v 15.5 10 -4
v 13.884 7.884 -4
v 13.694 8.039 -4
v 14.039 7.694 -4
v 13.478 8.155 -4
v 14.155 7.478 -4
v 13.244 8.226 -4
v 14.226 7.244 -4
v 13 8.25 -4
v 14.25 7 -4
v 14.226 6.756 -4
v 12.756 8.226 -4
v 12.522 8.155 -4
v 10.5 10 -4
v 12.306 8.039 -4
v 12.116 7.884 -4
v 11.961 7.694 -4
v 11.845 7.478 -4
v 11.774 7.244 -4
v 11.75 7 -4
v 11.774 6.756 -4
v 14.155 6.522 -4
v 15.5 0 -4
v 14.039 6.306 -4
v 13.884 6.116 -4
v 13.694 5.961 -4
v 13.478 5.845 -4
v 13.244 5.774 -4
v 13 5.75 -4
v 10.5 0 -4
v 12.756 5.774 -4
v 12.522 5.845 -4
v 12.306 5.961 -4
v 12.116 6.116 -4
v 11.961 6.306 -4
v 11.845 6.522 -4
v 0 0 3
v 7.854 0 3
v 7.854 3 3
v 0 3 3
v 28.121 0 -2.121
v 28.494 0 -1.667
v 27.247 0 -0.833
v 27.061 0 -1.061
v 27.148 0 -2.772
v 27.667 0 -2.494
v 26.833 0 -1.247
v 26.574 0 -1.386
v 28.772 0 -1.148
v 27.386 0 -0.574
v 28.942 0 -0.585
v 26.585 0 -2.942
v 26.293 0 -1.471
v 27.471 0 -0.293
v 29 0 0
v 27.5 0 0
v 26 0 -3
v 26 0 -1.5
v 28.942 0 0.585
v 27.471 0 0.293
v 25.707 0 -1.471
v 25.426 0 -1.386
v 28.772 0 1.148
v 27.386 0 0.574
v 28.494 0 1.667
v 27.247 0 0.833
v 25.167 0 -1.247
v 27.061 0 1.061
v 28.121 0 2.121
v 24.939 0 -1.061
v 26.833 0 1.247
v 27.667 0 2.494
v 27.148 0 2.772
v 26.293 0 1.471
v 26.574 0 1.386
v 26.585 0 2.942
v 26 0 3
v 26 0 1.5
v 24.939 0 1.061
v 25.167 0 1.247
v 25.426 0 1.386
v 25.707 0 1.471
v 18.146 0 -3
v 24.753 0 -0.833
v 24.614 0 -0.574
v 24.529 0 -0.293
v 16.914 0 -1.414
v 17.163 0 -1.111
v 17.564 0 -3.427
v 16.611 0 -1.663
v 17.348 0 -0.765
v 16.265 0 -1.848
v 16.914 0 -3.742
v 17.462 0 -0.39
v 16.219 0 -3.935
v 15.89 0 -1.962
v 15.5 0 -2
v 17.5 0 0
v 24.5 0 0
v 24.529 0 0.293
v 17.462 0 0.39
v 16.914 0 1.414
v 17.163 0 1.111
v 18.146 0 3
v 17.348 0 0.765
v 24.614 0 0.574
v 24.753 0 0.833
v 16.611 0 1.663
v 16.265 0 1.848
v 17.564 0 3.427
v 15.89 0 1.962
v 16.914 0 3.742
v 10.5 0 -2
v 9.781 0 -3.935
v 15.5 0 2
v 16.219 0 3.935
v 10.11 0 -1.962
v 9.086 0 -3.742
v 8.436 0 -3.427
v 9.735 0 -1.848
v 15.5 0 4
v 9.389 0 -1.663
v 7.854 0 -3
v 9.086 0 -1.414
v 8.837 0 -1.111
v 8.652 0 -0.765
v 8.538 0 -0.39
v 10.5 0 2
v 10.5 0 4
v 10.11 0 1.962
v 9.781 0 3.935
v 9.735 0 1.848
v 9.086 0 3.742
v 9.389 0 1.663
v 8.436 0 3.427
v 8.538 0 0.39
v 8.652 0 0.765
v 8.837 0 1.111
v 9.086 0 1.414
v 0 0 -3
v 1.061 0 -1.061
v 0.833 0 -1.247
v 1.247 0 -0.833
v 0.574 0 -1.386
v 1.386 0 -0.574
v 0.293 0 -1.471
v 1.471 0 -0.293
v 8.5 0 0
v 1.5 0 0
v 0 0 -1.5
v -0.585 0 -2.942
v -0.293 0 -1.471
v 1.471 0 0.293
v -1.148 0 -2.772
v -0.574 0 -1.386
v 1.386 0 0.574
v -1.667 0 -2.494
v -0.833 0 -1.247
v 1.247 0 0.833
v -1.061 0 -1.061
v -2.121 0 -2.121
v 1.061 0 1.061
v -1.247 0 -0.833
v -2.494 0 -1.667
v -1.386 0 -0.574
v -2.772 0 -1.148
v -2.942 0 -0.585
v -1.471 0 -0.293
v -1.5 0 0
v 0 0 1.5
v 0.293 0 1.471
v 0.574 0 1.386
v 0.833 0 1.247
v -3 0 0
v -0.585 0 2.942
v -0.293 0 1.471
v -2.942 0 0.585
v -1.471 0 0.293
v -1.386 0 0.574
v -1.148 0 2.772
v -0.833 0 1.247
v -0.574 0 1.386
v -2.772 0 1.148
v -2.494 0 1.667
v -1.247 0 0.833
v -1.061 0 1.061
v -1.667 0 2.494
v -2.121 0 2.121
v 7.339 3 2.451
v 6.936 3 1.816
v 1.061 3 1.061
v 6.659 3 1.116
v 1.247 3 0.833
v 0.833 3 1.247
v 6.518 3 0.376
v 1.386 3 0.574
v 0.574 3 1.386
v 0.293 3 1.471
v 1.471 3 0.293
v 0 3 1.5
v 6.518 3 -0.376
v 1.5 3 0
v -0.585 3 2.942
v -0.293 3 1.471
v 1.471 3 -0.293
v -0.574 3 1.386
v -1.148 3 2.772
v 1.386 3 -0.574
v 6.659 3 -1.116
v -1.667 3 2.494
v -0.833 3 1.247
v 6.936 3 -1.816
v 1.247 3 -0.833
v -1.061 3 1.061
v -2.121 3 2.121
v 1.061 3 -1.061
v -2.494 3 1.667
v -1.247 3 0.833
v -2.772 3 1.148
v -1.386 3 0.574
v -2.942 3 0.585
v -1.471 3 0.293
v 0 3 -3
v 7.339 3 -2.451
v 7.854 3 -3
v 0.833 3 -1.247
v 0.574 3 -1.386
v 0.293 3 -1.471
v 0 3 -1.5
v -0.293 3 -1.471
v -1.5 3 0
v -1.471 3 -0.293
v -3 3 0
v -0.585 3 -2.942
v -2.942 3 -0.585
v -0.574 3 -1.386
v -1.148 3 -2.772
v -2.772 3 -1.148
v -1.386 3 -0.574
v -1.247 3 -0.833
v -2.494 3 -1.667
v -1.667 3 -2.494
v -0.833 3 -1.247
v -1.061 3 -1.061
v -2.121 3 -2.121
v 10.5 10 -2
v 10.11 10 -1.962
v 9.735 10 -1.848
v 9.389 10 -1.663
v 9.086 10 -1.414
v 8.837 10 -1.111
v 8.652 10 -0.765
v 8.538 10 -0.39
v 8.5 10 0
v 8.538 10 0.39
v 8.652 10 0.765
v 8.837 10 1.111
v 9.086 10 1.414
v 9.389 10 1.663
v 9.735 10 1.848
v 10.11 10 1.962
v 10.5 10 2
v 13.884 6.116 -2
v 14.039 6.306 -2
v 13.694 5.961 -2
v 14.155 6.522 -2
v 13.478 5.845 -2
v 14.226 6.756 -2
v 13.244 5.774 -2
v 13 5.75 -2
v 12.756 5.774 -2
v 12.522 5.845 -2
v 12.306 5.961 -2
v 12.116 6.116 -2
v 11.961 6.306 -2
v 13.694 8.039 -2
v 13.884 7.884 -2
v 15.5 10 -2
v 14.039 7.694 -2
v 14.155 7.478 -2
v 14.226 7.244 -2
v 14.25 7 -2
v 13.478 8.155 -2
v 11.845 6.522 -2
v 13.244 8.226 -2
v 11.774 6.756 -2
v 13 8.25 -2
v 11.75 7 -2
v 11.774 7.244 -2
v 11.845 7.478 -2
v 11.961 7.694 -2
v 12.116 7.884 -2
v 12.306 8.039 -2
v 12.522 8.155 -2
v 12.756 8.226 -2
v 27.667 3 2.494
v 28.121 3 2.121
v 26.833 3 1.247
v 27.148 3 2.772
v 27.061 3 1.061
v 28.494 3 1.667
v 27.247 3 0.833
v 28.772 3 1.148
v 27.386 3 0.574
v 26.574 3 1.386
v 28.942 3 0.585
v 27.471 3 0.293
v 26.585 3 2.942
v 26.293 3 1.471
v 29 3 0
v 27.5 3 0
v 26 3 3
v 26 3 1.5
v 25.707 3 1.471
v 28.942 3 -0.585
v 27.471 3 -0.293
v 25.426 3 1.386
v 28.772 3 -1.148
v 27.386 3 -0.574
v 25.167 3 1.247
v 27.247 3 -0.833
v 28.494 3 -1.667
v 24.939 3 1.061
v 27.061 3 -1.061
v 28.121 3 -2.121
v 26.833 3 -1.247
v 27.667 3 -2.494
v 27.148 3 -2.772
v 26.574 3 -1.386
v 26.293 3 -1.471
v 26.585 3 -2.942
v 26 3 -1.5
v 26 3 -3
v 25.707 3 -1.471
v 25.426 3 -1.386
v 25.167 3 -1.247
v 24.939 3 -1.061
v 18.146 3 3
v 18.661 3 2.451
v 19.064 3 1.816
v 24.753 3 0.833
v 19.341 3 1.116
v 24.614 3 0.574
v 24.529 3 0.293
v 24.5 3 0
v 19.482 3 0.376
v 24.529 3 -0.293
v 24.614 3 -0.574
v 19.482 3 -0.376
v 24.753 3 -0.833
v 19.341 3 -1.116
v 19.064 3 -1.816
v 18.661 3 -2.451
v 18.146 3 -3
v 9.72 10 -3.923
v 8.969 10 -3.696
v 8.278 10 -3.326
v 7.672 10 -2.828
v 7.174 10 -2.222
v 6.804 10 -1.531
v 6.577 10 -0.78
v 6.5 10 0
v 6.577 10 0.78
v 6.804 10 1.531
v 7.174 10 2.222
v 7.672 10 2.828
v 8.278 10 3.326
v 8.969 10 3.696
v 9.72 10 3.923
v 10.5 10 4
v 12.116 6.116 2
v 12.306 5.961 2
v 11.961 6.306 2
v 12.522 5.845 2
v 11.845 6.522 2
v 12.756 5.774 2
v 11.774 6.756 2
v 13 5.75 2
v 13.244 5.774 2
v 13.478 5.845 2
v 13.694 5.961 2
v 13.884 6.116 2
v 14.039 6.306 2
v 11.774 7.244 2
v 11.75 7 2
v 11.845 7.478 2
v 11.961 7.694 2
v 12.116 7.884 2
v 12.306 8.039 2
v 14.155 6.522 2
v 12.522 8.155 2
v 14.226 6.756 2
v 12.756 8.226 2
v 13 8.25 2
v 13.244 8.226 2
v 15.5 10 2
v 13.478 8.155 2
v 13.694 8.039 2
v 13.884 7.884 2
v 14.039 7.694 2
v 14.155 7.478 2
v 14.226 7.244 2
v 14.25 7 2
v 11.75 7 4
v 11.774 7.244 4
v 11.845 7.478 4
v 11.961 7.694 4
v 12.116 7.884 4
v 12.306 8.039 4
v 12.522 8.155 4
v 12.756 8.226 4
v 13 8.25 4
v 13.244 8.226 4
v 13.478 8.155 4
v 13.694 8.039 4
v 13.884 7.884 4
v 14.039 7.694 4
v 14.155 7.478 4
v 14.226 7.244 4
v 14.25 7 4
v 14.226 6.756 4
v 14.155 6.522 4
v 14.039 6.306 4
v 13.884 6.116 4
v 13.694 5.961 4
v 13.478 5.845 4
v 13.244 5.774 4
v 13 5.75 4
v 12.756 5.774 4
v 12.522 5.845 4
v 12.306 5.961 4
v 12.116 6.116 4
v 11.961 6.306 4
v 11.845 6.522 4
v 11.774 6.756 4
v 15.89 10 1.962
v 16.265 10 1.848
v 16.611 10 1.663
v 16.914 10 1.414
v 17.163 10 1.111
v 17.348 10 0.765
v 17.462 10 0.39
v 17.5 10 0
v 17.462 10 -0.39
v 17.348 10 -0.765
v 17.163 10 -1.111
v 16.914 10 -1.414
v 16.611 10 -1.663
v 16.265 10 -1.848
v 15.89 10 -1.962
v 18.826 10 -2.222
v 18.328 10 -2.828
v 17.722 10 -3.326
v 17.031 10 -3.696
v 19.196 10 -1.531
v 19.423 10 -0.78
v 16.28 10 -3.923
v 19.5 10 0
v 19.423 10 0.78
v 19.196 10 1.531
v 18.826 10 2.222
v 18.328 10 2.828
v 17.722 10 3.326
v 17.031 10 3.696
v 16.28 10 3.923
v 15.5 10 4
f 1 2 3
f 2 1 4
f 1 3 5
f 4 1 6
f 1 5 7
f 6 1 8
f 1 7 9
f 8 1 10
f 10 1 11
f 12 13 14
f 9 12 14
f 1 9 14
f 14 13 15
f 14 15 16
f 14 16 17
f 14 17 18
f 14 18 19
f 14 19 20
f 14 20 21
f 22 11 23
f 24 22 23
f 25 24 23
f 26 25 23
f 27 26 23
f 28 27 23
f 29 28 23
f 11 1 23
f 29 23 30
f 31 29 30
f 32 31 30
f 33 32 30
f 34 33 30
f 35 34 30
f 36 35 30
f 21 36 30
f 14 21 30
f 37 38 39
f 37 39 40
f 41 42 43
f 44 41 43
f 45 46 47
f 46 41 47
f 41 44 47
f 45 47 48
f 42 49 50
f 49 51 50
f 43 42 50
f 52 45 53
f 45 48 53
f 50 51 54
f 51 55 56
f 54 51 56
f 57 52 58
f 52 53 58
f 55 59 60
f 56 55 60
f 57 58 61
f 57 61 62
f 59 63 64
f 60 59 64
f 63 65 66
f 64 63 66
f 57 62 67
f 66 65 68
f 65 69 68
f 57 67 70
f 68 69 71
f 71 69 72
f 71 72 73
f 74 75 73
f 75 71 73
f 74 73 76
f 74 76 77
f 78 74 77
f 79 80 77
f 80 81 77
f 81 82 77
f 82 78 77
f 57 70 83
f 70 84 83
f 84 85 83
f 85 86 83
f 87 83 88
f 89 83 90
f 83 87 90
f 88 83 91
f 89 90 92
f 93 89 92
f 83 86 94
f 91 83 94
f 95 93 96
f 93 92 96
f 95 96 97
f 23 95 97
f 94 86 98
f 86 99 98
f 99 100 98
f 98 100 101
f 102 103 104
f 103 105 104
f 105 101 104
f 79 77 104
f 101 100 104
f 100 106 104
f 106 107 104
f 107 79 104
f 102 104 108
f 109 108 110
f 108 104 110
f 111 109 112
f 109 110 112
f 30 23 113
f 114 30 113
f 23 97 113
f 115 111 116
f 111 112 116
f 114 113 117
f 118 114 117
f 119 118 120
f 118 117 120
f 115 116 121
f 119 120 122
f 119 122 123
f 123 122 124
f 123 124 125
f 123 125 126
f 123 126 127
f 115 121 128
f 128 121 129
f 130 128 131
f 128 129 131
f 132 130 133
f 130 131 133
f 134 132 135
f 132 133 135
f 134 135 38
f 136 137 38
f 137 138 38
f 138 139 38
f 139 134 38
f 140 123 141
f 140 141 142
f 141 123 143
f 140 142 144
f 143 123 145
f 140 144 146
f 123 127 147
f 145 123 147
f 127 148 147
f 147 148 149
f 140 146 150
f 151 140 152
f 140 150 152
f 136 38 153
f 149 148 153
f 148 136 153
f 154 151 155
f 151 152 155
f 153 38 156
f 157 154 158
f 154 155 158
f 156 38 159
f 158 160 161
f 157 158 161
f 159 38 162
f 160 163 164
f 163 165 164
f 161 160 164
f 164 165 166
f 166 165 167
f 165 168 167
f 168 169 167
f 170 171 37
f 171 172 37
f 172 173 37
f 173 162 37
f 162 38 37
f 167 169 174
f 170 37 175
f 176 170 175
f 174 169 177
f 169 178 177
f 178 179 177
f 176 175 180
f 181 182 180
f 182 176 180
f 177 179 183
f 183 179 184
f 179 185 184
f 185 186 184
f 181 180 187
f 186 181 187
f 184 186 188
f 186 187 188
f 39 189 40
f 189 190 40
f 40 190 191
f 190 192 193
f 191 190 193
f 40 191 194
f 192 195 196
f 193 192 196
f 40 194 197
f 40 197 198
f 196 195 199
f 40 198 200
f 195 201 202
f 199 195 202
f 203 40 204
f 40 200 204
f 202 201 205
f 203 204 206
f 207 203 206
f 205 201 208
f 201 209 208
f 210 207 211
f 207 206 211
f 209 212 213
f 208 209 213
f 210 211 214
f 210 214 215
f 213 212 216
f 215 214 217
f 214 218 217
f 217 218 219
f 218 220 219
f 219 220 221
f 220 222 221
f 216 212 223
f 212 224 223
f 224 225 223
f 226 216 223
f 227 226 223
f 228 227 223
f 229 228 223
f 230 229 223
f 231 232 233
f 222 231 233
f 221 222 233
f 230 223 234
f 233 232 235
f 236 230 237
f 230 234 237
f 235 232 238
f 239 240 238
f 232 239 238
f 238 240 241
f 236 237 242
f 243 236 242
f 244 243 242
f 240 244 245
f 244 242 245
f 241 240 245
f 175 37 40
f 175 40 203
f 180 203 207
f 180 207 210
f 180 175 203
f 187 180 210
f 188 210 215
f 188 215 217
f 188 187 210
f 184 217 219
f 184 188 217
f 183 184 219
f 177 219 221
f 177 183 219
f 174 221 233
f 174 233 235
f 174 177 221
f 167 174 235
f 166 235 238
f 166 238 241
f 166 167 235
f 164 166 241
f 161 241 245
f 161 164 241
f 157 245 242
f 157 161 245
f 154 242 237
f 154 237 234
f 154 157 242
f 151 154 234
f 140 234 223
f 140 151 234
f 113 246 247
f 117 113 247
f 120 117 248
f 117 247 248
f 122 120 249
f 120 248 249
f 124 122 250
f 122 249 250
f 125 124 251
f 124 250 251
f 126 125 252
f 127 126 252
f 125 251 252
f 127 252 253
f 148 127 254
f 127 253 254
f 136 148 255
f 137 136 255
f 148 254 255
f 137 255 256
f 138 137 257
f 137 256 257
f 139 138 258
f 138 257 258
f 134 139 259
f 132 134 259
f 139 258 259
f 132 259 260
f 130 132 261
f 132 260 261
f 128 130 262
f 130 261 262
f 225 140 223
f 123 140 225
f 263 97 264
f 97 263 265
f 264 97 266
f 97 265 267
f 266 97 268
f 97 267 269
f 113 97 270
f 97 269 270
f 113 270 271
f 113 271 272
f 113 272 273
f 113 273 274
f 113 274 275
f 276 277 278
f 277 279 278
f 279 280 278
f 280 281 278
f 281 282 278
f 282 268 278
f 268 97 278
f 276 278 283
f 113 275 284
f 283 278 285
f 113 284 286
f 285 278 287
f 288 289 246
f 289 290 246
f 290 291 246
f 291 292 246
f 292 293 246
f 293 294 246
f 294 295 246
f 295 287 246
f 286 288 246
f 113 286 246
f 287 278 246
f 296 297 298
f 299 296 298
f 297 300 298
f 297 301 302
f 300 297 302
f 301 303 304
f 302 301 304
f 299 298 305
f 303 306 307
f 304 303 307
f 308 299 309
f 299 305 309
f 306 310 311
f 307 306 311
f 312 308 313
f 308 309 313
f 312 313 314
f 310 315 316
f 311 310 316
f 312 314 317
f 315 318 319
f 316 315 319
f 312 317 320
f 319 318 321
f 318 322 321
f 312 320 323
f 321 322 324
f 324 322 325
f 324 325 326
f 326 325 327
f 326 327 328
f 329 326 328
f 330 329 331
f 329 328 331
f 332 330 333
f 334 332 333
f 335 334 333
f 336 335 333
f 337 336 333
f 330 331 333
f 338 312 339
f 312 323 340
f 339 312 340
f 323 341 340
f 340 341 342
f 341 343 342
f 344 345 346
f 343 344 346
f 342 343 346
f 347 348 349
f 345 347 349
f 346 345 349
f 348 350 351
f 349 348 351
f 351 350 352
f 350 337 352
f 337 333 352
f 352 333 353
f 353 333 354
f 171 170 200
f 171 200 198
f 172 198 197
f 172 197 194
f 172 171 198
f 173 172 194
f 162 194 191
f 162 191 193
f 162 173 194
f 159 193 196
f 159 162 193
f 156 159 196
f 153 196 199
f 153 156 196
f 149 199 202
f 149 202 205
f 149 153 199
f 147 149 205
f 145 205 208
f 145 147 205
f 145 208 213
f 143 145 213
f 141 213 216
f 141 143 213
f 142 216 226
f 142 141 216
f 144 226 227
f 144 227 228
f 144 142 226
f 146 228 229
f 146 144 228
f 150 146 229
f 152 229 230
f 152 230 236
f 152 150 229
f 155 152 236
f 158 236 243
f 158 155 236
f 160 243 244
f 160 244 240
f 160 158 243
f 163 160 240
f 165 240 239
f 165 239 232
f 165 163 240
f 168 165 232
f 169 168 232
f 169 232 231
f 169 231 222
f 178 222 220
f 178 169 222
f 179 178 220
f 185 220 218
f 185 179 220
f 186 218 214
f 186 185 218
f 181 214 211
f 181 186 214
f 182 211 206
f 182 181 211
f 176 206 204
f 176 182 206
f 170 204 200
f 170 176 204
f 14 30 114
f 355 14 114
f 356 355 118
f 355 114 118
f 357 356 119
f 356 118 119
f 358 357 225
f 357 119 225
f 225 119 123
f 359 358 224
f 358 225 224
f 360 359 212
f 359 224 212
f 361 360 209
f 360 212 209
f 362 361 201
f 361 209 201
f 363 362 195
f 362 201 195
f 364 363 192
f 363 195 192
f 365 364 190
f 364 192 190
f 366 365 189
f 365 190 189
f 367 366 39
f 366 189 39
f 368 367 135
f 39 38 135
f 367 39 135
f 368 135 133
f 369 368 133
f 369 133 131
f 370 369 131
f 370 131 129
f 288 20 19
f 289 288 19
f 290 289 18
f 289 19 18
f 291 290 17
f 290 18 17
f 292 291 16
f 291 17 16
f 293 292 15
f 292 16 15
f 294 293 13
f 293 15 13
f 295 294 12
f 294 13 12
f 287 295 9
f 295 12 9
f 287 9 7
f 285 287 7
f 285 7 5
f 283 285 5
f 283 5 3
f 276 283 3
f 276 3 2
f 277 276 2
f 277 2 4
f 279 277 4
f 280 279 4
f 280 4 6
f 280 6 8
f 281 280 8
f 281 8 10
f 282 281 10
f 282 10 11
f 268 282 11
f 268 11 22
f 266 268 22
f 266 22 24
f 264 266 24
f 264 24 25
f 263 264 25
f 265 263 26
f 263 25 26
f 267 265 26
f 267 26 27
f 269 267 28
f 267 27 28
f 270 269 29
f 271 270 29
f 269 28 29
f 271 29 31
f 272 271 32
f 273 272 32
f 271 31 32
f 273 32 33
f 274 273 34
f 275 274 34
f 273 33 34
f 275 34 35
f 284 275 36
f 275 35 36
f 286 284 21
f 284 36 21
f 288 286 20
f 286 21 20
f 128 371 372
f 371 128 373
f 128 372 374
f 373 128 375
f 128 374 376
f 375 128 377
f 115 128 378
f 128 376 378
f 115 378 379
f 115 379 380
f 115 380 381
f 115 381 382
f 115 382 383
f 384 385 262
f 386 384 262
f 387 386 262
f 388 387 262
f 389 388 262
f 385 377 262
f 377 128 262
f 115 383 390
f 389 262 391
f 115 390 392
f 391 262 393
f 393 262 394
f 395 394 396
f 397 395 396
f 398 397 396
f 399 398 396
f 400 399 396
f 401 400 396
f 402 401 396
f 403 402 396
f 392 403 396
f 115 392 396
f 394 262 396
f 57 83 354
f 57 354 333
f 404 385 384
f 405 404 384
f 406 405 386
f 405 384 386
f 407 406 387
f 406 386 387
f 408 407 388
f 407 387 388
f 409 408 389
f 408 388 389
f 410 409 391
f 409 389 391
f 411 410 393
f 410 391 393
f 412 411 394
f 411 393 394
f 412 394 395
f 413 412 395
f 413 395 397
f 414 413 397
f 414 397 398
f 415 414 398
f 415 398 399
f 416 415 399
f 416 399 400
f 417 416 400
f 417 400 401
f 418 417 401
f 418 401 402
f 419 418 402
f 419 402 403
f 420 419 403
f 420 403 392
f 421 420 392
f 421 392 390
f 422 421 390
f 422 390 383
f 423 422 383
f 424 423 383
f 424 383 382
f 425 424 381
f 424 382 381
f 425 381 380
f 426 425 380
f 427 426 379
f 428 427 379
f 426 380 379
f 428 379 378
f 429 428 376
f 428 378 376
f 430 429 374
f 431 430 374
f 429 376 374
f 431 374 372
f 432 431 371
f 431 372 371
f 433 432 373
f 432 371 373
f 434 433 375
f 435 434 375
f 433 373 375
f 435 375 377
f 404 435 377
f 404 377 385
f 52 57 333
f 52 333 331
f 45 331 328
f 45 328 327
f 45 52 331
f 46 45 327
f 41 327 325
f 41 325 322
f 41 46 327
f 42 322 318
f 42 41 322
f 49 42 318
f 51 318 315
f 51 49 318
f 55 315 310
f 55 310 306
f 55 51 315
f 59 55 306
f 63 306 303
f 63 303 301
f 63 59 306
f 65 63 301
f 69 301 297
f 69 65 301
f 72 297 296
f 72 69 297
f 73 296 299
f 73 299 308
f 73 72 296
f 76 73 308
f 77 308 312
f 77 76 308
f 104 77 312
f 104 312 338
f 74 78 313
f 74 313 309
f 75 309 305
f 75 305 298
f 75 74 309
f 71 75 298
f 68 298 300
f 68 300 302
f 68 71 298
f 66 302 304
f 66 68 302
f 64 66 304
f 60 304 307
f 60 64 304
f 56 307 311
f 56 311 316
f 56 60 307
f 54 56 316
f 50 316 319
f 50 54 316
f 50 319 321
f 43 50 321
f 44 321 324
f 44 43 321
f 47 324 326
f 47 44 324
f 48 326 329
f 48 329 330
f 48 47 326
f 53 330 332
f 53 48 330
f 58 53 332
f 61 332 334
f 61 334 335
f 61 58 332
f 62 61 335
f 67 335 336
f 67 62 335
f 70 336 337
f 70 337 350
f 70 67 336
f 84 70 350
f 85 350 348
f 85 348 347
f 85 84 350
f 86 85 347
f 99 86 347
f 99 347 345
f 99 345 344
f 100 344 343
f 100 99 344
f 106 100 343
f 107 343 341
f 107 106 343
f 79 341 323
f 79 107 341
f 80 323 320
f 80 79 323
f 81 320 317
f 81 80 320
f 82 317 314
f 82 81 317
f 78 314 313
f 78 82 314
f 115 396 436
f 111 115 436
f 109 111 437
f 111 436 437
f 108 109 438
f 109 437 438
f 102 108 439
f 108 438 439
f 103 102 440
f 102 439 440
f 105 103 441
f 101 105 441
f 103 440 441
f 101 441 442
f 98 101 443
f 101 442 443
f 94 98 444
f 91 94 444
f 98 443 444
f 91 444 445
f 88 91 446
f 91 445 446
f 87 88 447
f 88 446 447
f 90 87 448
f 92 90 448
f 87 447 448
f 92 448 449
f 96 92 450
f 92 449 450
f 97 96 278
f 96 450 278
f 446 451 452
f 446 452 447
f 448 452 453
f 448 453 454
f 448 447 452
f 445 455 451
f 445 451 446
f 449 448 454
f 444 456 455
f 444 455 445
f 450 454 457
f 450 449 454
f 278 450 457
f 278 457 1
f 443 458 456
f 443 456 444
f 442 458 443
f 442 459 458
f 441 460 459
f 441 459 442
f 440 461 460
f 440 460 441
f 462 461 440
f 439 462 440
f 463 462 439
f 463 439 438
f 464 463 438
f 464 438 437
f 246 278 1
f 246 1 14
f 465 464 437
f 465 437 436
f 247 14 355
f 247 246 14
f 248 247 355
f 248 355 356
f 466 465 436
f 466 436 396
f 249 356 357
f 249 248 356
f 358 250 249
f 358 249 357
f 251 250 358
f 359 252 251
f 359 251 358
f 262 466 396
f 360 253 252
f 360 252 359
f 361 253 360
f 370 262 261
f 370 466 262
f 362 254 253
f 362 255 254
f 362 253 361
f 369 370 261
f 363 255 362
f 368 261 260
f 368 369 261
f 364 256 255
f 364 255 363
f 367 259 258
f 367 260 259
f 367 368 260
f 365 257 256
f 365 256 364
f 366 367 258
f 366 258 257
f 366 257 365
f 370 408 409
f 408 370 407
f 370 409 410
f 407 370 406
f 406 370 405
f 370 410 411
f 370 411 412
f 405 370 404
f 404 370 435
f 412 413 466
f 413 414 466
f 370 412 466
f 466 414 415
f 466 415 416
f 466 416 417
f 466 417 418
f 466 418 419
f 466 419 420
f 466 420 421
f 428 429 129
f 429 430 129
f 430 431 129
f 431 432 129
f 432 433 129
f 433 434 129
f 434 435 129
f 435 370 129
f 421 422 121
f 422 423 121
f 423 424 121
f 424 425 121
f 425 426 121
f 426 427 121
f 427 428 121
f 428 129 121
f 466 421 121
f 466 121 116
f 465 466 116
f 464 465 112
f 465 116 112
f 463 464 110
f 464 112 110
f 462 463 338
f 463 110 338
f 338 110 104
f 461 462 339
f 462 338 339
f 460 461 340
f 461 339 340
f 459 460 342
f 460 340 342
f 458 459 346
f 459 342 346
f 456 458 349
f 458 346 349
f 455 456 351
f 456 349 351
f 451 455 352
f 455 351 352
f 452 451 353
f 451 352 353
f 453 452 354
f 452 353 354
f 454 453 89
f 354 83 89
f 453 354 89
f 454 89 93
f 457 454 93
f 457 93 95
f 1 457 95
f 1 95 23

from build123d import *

# Parameters (mm, degrees)
SKETCH_1_R          = 1.5
EXTRUDE_1_DEPTH     = 3
EXTRUDE_2_DEPTH     = 10
SKETCH_7_R          = 1.25
CUT_EXTRUDE_7_DEPTH = 32.701734968
CUT_EXTRUDE_8_DEPTH = 31.935416597


with BuildPart() as part:
    # 草图1 → 凸台-拉伸1 (new body)
    with BuildSketch(Plane(origin=(0, 0, 0), x_dir=(1, 0, 0), z_dir=(0, 1, 0))):
        with BuildLine():
            Line((0, 3), (26, 3))
            ThreePointArc((26, 3), (29, 0), (26, -3))
            Line((26, -3), (0, -3))
            ThreePointArc((0, -3), (-3, 0), (0, 3))
        make_face()
        with Locations(Location((0, 0, 0), (0, 0, 270))):
            Circle(SKETCH_1_R, mode=Mode.SUBTRACT)
        with Locations(Location((26, 0, 0), (0, 0, 270))):
            Circle(SKETCH_1_R, mode=Mode.SUBTRACT)
    extrude(amount=EXTRUDE_1_DEPTH)

    # 草图6 → 凸台-拉伸2 (add)
    with BuildSketch(Plane.XZ):
        with BuildLine():
            Line((10.5, 4), (15.5, 4))
            ThreePointArc((15.5, 4), (19.5, 0), (15.5, -4))
            Line((15.5, -4), (10.5, -4))
            ThreePointArc((10.5, -4), (6.5, 0), (10.5, 4))
        make_face()
    extrude(amount=-EXTRUDE_2_DEPTH)

    # 草图7 → 切除-拉伸7 (cut, through all)
    with BuildSketch(Plane(origin=(0, 0, -4), x_dir=(-1, 0, 0), z_dir=(0, 0, -1))):
        with Locations((-13, 7)):
            Circle(SKETCH_7_R)
    extrude(amount=-CUT_EXTRUDE_7_DEPTH, mode=Mode.SUBTRACT)

    # 草图9 → 切除-拉伸8 (cut, through all)
    with BuildSketch(Plane(origin=(0, 10, 0), x_dir=(1, 0, 0), z_dir=(0, 1, 0))):
        with BuildLine():
            Line((10.5, -2), (15.5, -2))
            ThreePointArc((15.5, -2), (17.5, 0), (15.5, 2))
            Line((15.5, 2), (10.5, 2))
            ThreePointArc((10.5, 2), (8.5, 0), (10.5, -2))
        make_face()
    extrude(amount=-CUT_EXTRUDE_8_DEPTH, mode=Mode.SUBTRACT)


solid = part.part
